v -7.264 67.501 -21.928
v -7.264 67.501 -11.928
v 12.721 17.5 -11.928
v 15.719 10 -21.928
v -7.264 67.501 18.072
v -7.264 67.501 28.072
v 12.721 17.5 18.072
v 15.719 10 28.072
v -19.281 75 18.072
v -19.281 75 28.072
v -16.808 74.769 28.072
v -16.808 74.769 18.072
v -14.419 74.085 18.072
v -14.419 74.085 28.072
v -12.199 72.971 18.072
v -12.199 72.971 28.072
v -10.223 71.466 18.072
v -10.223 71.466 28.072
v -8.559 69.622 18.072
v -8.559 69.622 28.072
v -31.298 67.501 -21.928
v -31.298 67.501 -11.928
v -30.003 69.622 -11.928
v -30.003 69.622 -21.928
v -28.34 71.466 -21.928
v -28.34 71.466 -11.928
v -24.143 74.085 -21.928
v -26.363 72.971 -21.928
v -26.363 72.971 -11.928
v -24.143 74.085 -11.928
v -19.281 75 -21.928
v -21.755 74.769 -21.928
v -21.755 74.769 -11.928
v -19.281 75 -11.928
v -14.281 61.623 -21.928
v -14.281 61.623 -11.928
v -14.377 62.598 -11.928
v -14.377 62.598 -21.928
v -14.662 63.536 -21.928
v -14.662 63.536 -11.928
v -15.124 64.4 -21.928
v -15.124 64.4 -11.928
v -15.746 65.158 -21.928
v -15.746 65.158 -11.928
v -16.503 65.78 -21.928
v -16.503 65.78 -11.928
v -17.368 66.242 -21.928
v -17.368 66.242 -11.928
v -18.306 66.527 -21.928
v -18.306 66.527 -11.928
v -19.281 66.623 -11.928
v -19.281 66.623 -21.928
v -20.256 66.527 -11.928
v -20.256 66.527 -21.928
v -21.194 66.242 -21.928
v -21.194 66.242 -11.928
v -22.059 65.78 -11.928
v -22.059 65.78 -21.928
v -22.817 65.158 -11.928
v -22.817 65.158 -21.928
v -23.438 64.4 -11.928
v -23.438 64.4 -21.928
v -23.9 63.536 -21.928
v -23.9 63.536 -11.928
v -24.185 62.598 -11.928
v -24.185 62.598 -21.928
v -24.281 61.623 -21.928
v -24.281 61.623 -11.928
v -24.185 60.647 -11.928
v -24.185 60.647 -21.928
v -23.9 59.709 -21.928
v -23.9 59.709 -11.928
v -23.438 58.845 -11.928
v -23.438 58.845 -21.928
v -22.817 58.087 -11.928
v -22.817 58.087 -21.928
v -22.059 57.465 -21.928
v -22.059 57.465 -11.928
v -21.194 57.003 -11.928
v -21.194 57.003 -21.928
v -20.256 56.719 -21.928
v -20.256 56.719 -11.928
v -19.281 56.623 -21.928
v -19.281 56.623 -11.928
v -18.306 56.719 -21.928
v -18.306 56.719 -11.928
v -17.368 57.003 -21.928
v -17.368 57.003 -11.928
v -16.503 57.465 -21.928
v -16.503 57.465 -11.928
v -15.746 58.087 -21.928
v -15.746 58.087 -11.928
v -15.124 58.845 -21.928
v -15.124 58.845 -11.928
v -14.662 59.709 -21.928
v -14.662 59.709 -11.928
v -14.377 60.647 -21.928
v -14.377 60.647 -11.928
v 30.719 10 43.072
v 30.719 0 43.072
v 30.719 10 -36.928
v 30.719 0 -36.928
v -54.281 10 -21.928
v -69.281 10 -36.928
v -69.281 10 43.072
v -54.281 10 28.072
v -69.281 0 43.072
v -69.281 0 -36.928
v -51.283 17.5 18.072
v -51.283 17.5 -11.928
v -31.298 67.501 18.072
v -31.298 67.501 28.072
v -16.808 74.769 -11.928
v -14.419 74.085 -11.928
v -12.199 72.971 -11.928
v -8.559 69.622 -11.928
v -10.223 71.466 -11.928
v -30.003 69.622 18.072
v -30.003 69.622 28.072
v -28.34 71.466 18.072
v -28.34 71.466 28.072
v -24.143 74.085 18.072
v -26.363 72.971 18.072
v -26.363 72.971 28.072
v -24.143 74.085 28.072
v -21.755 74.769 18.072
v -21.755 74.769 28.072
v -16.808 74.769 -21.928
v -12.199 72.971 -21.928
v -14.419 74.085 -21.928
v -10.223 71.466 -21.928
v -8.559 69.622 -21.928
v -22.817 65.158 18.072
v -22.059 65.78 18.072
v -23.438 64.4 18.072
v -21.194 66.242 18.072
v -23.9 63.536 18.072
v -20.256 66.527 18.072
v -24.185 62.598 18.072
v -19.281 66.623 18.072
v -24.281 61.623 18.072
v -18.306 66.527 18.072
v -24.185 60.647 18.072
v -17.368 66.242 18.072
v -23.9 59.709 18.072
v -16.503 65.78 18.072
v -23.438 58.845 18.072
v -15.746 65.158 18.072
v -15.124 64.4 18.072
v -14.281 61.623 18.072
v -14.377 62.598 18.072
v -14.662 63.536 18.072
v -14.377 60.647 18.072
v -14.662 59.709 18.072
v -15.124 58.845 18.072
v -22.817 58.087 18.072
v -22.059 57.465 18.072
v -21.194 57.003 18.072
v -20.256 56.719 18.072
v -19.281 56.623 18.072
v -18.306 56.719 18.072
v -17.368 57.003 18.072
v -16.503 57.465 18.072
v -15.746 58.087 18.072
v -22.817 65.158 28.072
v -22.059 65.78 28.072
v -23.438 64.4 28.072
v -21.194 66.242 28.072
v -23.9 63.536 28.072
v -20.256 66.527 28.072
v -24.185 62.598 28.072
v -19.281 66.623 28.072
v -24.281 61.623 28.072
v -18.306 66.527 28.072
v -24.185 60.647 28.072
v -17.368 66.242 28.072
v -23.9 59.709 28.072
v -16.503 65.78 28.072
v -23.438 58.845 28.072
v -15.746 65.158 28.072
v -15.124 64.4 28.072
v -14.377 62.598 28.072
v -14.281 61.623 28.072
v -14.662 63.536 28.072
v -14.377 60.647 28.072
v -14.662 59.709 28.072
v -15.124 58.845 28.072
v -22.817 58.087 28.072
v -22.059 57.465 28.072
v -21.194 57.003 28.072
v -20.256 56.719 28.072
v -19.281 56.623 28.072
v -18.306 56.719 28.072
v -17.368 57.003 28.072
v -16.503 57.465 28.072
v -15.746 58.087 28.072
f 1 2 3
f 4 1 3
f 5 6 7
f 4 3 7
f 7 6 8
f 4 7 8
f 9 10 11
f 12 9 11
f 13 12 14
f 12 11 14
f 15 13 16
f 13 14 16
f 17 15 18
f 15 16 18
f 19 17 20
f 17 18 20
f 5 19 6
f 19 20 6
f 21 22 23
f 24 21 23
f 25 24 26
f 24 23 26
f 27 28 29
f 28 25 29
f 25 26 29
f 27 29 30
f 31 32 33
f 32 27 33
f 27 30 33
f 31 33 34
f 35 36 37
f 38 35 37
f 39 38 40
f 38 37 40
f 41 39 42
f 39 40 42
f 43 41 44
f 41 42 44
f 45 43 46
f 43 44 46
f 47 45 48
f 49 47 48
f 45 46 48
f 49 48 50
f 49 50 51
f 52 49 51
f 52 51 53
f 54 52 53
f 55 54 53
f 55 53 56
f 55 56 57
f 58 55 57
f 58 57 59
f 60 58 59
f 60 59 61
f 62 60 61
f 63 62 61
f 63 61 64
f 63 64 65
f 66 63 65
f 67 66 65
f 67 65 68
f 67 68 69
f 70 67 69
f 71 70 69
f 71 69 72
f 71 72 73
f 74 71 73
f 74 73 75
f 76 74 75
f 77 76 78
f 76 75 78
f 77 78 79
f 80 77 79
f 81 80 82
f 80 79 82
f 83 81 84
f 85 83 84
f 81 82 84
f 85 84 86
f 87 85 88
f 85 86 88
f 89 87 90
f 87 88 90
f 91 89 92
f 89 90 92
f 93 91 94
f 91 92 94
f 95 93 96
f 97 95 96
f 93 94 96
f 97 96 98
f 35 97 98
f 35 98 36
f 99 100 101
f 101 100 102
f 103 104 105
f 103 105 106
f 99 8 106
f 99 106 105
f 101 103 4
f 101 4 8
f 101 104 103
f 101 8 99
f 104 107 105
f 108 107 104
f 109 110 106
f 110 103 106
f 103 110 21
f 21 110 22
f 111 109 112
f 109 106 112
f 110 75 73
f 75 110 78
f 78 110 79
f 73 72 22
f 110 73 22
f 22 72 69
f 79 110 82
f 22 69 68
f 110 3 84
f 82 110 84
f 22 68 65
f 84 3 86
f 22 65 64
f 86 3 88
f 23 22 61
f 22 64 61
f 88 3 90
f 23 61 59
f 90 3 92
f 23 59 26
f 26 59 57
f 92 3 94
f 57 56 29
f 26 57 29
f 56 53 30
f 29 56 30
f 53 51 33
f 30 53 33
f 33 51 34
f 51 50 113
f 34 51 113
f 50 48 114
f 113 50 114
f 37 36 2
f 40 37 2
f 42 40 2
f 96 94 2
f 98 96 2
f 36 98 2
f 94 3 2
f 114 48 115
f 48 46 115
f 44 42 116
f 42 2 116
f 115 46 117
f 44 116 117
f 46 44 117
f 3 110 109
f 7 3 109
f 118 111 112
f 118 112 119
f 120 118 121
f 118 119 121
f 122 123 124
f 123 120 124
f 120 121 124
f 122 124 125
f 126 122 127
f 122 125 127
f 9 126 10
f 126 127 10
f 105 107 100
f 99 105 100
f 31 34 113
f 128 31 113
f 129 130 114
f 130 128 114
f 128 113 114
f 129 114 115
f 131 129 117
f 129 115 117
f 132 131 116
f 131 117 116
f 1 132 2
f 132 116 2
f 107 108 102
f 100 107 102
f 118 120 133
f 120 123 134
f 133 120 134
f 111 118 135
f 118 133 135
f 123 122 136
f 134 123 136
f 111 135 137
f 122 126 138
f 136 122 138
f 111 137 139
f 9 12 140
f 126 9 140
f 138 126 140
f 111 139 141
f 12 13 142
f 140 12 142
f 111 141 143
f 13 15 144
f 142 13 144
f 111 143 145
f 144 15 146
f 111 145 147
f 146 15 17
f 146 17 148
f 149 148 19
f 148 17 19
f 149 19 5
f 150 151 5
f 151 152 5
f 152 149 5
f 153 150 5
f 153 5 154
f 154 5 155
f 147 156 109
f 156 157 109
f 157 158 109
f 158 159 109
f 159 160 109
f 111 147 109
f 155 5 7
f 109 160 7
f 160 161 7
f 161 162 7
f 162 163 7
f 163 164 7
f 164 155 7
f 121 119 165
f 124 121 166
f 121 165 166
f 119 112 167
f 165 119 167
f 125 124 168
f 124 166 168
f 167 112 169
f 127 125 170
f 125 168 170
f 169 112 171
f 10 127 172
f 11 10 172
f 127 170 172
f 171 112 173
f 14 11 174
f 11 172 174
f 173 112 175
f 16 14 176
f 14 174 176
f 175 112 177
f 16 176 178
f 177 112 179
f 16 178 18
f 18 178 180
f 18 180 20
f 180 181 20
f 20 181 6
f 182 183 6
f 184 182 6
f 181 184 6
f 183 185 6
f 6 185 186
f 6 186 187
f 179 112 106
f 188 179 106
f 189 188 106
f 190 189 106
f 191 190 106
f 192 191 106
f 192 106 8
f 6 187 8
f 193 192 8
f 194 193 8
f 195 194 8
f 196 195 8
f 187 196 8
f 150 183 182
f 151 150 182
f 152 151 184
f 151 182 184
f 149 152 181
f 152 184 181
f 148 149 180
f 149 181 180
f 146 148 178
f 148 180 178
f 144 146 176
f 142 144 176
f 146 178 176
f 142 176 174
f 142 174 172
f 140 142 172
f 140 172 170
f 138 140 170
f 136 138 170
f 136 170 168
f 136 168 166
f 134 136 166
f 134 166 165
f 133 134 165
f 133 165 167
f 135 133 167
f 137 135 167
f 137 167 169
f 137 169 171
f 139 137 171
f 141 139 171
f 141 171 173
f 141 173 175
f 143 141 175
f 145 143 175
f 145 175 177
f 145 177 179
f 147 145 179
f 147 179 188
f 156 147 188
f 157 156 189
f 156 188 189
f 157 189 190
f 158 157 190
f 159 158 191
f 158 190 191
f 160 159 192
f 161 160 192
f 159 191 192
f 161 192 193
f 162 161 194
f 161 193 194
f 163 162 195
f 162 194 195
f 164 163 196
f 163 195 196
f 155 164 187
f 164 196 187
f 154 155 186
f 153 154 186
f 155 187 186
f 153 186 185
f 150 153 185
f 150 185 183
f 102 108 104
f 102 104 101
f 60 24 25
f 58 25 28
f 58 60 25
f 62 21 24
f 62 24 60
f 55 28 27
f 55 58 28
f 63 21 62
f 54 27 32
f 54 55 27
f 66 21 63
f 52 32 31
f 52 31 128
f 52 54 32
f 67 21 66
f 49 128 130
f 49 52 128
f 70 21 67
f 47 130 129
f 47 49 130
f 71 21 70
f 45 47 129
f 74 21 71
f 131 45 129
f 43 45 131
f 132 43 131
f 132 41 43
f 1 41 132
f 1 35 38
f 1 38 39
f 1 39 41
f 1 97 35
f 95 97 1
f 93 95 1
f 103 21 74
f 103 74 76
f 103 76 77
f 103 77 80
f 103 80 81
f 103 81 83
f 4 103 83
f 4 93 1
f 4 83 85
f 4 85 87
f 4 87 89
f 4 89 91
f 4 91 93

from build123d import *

# Parameters (mm, degrees)
SKETCH1_W           = 100
SKETCH1_H           = 80
BOSS_EXTRUDE1_DEPTH = 10
SKETCH2_W           = 70
SKETCH2_H           = 50
BOSS_EXTRUDE2_DEPTH = 65
CUT_EXTRUDE2_DEPTH  = 94
SKETCH3_R           = 5
CUT_EXTRUDE4_DEPTH  = 94


with BuildPart() as part:
    # Sketch1 → Boss-Extrude1 (new body)
    with BuildSketch(Plane(origin=(0, 0, 0), x_dir=(1, 0, 0), z_dir=(0, 1, 0))):
        with Locations((-19.281045752, -3.071895425)):
            Rectangle(SKETCH1_W, SKETCH1_H)
    extrude(amount=BOSS_EXTRUDE1_DEPTH)

    # Sketch2 → Boss-Extrude2 (add)
    with BuildSketch(Plane(origin=(0, 10, 0), x_dir=(1, 0, 0), z_dir=(0, 1, 0))):
        with Locations((-19.281045752, -3.071895425)):
            Rectangle(SKETCH2_W, SKETCH2_H)
    extrude(amount=BOSS_EXTRUDE2_DEPTH)

    # Sketch5 → Cut-Extrude2 (cut)
    with BuildSketch(Plane(origin=(15.718954248, 0, 0), x_dir=(0, 0, -1), z_dir=(1, 0, 0))):
        Polygon((11.928104575, 17.5), (-18.071895425, 17.5), (-18.071895425, 67.5), (-18.071895425, 75), (11.928104575, 75), (11.928104575, 67.5), align=None)
    extrude(amount=-CUT_EXTRUDE2_DEPTH, mode=Mode.SUBTRACT)

    # Sketch3 → Cut-Extrude4 (cut)
    with BuildSketch(Plane.XY.offset(28.071895425)):
        Polygon((-54.281045752, 75), (-54.281045752, 10), (-31.2976006, 67.501159063), (-28.300283638, 75), align=None)
        with BuildLine():
            Line((-28.300283638, 75), (-31.2976006, 67.501159063))
            ThreePointArc((-31.2976006, 67.501159063), (-26.363245371, 72.97149148), (-19.281045752, 75))
            Line((-19.281045752, 75), (-28.300283638, 75))
        make_face()
        with BuildLine():
            Line((-10.261807865, 75), (-19.281045752, 75))
            ThreePointArc((-19.281045752, 75), (-12.198846132, 72.97149148), (-7.264490904, 67.501159063))
            Line((-7.264490904, 67.501159063), (-10.261807865, 75))
        make_face()
        Polygon((-10.261807865, 75), (-7.264490904, 67.501159063), (15.718954248, 10), (15.718954248, 75), align=None)
        with Locations((-19.281045752, 61.622585577)):
            Circle(SKETCH3_R)
    extrude(amount=-CUT_EXTRUDE4_DEPTH, mode=Mode.SUBTRACT)


solid = part.part
